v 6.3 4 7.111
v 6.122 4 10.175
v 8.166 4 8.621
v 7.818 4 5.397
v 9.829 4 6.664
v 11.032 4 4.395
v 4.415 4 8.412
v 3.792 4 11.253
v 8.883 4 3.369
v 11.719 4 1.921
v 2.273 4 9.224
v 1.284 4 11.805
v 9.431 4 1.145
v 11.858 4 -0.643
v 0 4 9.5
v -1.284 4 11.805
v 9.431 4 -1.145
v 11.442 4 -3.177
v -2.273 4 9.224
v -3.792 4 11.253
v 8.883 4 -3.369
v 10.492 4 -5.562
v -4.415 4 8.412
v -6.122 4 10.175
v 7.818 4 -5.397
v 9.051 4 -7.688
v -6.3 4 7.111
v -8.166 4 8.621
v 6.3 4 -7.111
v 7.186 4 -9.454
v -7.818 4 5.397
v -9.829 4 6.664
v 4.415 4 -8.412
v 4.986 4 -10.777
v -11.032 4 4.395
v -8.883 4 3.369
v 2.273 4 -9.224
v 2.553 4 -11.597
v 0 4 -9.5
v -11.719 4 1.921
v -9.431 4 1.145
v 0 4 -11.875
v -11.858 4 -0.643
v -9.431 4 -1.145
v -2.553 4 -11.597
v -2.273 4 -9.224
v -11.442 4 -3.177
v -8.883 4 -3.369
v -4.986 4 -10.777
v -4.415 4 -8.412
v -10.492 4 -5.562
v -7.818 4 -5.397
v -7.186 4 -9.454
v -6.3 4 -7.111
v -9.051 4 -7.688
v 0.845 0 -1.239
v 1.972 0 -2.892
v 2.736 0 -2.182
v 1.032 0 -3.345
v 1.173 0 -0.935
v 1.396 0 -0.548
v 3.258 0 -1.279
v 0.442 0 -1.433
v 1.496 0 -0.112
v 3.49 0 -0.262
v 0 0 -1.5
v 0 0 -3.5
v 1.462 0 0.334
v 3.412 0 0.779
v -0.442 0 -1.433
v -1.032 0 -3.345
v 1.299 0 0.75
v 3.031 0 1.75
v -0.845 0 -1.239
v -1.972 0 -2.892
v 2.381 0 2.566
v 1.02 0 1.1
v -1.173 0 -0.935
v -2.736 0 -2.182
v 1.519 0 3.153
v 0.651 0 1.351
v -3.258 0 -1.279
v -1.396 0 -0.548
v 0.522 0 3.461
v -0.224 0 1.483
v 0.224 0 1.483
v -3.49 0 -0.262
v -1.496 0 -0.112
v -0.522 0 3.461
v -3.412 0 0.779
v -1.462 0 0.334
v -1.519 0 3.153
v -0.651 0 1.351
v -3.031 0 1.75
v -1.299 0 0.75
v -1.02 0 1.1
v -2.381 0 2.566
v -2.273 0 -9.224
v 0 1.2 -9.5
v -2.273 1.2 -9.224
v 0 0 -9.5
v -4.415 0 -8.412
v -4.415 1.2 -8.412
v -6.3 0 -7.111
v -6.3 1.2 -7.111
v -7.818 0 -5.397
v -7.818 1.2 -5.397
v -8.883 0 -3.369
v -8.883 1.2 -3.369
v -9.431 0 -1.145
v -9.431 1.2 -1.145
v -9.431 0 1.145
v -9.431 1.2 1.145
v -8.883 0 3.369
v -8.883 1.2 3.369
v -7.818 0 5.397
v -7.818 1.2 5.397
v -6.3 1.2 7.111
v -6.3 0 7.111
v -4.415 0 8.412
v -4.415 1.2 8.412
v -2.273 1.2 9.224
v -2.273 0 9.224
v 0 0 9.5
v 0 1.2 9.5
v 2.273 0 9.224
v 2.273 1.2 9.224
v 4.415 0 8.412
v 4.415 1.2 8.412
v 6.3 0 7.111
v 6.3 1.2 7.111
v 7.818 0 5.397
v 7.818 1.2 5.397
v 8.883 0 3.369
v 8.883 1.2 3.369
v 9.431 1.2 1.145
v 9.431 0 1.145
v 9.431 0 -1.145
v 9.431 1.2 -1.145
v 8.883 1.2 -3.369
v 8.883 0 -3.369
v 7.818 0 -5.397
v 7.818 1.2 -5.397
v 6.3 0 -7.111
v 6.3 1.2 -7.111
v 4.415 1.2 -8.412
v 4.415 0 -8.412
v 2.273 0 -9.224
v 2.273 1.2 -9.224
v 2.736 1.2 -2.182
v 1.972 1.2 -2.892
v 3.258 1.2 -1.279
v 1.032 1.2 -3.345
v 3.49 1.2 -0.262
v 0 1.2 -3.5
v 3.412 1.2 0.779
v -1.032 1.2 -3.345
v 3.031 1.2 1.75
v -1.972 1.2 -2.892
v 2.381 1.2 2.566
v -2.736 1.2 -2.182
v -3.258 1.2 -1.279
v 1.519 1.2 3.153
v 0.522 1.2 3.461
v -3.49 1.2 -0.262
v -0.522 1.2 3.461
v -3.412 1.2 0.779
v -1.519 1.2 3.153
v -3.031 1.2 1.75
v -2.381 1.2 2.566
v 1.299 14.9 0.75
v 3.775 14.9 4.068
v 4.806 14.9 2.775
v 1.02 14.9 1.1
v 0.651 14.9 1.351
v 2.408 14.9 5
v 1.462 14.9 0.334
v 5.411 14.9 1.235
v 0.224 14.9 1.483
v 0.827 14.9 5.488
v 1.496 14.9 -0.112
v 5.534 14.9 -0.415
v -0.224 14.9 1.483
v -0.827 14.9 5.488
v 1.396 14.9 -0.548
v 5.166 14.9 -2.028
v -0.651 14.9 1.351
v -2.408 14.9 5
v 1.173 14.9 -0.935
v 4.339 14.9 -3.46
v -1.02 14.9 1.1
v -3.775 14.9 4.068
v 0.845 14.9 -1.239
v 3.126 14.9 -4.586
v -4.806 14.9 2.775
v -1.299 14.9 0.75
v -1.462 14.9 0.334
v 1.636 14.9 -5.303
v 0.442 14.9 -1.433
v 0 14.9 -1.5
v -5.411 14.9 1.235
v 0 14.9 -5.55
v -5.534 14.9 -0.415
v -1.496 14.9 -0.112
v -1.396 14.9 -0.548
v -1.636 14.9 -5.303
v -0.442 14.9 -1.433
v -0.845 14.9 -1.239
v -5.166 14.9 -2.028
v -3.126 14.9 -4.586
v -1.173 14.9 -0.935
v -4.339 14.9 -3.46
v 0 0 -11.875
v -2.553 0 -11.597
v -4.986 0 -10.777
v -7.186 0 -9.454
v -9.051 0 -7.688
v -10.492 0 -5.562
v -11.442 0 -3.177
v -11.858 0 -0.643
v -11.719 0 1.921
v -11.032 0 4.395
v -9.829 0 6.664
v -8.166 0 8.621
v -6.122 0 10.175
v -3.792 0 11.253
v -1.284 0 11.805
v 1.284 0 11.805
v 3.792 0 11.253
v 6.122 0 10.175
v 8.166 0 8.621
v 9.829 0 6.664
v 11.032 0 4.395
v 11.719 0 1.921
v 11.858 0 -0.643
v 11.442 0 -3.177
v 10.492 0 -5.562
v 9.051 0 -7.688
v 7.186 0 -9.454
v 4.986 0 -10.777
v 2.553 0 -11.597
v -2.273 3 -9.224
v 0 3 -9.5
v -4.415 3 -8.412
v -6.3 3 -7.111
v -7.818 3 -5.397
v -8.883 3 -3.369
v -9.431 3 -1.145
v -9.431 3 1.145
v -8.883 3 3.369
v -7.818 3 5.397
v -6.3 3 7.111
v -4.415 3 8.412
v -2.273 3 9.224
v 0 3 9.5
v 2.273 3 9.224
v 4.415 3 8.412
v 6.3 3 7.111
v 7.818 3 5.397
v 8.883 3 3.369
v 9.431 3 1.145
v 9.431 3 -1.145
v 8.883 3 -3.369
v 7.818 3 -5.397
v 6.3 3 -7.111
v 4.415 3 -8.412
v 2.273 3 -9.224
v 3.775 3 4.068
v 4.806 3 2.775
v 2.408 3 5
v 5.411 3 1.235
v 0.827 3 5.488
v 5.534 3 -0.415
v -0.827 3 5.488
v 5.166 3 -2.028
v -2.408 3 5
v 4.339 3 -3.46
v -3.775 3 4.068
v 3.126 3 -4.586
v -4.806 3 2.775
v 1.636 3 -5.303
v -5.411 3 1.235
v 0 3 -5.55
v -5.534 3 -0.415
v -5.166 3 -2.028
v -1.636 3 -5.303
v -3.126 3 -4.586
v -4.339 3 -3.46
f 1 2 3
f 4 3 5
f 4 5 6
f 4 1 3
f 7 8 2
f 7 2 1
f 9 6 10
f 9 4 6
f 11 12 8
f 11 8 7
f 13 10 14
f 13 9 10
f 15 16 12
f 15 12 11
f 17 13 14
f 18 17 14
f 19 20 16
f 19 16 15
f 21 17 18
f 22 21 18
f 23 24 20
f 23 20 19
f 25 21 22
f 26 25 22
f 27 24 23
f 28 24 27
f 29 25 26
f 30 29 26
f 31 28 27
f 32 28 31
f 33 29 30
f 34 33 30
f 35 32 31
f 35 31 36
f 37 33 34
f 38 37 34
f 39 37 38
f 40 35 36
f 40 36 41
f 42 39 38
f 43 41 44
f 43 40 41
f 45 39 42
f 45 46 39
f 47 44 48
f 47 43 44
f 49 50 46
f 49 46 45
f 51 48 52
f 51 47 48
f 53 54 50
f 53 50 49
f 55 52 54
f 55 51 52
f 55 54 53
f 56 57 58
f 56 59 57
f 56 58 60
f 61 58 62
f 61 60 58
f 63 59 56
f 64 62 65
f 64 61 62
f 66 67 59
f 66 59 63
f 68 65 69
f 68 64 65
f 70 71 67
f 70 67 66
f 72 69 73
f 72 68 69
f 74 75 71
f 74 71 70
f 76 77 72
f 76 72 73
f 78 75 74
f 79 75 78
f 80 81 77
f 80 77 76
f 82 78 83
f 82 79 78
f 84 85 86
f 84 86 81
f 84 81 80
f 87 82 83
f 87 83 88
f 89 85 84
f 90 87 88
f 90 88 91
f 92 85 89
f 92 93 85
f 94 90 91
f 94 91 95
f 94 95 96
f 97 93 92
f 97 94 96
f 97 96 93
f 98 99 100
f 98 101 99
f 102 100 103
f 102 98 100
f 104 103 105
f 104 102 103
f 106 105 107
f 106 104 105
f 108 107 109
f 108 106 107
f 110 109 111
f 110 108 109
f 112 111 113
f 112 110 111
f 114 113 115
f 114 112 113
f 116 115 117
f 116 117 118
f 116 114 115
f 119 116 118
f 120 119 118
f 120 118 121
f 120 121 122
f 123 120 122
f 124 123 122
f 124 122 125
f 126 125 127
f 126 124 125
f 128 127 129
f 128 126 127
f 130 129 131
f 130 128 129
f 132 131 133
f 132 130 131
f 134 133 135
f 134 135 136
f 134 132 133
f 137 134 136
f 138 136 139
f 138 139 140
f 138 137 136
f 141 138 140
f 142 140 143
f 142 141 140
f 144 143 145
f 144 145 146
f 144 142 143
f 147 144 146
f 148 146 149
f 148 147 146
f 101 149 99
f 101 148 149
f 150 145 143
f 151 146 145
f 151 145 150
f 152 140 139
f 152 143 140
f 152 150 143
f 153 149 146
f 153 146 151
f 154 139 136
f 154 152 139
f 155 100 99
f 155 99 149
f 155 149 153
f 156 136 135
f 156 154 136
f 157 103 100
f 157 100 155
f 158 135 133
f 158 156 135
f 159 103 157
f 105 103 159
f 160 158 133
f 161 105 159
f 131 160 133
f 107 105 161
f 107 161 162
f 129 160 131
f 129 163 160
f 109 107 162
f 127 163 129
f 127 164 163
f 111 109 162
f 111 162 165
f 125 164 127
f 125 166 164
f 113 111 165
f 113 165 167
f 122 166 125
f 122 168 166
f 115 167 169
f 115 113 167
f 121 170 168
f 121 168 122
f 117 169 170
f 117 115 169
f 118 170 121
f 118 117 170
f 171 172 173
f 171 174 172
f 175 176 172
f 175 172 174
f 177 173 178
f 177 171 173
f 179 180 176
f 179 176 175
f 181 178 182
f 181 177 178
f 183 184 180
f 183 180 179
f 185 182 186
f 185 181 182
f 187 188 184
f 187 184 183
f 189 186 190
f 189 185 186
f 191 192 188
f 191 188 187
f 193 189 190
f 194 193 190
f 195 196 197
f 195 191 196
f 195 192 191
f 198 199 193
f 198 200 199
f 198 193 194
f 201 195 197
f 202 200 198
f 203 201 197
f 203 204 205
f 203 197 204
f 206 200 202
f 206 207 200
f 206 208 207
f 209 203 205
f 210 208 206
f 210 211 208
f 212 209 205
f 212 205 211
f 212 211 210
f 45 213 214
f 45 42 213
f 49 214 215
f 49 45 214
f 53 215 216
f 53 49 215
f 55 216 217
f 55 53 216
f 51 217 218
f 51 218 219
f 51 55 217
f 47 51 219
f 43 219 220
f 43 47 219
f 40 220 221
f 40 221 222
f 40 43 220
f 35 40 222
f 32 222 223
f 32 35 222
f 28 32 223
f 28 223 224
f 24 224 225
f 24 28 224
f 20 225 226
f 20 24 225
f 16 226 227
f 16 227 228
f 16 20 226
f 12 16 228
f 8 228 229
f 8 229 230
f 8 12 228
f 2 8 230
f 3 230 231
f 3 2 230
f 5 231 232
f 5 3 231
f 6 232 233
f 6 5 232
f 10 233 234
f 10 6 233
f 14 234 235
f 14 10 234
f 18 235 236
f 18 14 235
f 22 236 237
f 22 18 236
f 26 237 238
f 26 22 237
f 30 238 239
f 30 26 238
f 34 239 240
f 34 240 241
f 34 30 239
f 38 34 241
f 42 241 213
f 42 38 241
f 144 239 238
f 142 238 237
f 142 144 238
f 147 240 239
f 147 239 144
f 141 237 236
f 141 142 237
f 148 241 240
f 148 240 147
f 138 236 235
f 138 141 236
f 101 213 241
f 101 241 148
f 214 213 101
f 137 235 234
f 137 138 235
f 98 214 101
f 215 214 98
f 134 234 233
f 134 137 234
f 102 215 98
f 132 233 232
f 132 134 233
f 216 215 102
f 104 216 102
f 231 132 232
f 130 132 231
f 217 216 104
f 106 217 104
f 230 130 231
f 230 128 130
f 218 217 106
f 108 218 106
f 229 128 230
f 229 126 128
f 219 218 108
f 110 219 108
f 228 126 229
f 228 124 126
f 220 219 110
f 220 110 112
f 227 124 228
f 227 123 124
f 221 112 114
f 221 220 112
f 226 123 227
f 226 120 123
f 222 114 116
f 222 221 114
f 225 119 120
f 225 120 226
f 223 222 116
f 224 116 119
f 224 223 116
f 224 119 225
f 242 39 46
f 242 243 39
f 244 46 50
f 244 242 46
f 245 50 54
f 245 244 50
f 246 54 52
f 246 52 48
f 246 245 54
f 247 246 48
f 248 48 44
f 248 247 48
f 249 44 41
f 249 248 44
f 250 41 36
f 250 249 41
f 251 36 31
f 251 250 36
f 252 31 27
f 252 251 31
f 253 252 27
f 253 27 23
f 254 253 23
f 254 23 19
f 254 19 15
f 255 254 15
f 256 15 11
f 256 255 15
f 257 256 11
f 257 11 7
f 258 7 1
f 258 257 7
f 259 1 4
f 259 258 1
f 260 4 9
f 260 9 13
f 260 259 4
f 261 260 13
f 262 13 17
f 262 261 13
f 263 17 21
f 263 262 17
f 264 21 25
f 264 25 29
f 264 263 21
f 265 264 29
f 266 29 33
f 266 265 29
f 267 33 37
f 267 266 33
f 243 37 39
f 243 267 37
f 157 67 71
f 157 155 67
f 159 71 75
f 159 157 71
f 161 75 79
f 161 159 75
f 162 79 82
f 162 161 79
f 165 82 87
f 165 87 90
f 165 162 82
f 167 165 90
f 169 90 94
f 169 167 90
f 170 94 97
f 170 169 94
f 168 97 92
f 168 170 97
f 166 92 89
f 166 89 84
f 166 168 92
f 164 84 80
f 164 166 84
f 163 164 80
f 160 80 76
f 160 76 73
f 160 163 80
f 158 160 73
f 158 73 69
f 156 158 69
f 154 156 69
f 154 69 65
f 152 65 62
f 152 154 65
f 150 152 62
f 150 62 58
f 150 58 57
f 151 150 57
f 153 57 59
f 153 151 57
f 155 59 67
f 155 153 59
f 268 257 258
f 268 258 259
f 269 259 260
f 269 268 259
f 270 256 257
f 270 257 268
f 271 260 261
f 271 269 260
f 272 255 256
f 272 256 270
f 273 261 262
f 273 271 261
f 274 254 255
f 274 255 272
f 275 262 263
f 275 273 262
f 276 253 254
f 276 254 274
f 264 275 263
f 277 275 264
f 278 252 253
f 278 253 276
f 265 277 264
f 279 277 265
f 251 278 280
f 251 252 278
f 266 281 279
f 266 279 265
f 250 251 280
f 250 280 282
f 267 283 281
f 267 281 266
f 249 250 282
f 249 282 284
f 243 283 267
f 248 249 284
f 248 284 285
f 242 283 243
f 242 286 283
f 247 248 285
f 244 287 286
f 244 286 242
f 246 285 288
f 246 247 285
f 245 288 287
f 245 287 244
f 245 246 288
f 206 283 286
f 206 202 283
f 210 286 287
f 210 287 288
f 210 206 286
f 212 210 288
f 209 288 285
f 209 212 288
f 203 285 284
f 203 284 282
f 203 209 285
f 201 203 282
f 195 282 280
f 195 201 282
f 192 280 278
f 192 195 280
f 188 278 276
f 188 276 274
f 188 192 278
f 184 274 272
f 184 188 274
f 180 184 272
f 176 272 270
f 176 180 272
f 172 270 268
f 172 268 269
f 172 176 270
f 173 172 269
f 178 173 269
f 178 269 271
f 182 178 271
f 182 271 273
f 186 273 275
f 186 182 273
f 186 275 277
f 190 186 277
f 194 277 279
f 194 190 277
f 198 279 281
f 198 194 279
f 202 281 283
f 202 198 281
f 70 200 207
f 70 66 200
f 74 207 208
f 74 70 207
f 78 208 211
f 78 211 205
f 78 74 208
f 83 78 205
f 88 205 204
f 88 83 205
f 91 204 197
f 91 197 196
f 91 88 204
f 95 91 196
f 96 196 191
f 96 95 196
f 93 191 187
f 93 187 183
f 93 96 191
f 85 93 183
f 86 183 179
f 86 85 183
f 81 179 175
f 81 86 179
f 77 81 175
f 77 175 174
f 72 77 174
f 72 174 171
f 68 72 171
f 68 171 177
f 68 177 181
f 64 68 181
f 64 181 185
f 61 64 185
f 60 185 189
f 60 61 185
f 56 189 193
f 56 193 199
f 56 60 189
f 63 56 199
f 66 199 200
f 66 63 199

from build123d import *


with BuildPart() as part:
    # Sketch1 → 20 and 58 (revolve)
    with BuildSketch(Plane.XY, mode=Mode.PRIVATE) as f_20_and_58_sk:
        Polygon((1.5, 14.9), (1.5, 0), (3.5, 0), (3.5, 1.2), (9.5, 1.2), (9.5, 0), (11.875, 0), (11.875, 4), (9.5, 4), (9.5, 3), (5.55, 3), (5.55, 14.9), align=None)
    revolve(f_20_and_58_sk.sketch.rotate(Axis((0, 0, 0), (0, 1, 0)), 90), axis=Axis((0, 0, 0), (0, 1, 0)))


solid = part.part
